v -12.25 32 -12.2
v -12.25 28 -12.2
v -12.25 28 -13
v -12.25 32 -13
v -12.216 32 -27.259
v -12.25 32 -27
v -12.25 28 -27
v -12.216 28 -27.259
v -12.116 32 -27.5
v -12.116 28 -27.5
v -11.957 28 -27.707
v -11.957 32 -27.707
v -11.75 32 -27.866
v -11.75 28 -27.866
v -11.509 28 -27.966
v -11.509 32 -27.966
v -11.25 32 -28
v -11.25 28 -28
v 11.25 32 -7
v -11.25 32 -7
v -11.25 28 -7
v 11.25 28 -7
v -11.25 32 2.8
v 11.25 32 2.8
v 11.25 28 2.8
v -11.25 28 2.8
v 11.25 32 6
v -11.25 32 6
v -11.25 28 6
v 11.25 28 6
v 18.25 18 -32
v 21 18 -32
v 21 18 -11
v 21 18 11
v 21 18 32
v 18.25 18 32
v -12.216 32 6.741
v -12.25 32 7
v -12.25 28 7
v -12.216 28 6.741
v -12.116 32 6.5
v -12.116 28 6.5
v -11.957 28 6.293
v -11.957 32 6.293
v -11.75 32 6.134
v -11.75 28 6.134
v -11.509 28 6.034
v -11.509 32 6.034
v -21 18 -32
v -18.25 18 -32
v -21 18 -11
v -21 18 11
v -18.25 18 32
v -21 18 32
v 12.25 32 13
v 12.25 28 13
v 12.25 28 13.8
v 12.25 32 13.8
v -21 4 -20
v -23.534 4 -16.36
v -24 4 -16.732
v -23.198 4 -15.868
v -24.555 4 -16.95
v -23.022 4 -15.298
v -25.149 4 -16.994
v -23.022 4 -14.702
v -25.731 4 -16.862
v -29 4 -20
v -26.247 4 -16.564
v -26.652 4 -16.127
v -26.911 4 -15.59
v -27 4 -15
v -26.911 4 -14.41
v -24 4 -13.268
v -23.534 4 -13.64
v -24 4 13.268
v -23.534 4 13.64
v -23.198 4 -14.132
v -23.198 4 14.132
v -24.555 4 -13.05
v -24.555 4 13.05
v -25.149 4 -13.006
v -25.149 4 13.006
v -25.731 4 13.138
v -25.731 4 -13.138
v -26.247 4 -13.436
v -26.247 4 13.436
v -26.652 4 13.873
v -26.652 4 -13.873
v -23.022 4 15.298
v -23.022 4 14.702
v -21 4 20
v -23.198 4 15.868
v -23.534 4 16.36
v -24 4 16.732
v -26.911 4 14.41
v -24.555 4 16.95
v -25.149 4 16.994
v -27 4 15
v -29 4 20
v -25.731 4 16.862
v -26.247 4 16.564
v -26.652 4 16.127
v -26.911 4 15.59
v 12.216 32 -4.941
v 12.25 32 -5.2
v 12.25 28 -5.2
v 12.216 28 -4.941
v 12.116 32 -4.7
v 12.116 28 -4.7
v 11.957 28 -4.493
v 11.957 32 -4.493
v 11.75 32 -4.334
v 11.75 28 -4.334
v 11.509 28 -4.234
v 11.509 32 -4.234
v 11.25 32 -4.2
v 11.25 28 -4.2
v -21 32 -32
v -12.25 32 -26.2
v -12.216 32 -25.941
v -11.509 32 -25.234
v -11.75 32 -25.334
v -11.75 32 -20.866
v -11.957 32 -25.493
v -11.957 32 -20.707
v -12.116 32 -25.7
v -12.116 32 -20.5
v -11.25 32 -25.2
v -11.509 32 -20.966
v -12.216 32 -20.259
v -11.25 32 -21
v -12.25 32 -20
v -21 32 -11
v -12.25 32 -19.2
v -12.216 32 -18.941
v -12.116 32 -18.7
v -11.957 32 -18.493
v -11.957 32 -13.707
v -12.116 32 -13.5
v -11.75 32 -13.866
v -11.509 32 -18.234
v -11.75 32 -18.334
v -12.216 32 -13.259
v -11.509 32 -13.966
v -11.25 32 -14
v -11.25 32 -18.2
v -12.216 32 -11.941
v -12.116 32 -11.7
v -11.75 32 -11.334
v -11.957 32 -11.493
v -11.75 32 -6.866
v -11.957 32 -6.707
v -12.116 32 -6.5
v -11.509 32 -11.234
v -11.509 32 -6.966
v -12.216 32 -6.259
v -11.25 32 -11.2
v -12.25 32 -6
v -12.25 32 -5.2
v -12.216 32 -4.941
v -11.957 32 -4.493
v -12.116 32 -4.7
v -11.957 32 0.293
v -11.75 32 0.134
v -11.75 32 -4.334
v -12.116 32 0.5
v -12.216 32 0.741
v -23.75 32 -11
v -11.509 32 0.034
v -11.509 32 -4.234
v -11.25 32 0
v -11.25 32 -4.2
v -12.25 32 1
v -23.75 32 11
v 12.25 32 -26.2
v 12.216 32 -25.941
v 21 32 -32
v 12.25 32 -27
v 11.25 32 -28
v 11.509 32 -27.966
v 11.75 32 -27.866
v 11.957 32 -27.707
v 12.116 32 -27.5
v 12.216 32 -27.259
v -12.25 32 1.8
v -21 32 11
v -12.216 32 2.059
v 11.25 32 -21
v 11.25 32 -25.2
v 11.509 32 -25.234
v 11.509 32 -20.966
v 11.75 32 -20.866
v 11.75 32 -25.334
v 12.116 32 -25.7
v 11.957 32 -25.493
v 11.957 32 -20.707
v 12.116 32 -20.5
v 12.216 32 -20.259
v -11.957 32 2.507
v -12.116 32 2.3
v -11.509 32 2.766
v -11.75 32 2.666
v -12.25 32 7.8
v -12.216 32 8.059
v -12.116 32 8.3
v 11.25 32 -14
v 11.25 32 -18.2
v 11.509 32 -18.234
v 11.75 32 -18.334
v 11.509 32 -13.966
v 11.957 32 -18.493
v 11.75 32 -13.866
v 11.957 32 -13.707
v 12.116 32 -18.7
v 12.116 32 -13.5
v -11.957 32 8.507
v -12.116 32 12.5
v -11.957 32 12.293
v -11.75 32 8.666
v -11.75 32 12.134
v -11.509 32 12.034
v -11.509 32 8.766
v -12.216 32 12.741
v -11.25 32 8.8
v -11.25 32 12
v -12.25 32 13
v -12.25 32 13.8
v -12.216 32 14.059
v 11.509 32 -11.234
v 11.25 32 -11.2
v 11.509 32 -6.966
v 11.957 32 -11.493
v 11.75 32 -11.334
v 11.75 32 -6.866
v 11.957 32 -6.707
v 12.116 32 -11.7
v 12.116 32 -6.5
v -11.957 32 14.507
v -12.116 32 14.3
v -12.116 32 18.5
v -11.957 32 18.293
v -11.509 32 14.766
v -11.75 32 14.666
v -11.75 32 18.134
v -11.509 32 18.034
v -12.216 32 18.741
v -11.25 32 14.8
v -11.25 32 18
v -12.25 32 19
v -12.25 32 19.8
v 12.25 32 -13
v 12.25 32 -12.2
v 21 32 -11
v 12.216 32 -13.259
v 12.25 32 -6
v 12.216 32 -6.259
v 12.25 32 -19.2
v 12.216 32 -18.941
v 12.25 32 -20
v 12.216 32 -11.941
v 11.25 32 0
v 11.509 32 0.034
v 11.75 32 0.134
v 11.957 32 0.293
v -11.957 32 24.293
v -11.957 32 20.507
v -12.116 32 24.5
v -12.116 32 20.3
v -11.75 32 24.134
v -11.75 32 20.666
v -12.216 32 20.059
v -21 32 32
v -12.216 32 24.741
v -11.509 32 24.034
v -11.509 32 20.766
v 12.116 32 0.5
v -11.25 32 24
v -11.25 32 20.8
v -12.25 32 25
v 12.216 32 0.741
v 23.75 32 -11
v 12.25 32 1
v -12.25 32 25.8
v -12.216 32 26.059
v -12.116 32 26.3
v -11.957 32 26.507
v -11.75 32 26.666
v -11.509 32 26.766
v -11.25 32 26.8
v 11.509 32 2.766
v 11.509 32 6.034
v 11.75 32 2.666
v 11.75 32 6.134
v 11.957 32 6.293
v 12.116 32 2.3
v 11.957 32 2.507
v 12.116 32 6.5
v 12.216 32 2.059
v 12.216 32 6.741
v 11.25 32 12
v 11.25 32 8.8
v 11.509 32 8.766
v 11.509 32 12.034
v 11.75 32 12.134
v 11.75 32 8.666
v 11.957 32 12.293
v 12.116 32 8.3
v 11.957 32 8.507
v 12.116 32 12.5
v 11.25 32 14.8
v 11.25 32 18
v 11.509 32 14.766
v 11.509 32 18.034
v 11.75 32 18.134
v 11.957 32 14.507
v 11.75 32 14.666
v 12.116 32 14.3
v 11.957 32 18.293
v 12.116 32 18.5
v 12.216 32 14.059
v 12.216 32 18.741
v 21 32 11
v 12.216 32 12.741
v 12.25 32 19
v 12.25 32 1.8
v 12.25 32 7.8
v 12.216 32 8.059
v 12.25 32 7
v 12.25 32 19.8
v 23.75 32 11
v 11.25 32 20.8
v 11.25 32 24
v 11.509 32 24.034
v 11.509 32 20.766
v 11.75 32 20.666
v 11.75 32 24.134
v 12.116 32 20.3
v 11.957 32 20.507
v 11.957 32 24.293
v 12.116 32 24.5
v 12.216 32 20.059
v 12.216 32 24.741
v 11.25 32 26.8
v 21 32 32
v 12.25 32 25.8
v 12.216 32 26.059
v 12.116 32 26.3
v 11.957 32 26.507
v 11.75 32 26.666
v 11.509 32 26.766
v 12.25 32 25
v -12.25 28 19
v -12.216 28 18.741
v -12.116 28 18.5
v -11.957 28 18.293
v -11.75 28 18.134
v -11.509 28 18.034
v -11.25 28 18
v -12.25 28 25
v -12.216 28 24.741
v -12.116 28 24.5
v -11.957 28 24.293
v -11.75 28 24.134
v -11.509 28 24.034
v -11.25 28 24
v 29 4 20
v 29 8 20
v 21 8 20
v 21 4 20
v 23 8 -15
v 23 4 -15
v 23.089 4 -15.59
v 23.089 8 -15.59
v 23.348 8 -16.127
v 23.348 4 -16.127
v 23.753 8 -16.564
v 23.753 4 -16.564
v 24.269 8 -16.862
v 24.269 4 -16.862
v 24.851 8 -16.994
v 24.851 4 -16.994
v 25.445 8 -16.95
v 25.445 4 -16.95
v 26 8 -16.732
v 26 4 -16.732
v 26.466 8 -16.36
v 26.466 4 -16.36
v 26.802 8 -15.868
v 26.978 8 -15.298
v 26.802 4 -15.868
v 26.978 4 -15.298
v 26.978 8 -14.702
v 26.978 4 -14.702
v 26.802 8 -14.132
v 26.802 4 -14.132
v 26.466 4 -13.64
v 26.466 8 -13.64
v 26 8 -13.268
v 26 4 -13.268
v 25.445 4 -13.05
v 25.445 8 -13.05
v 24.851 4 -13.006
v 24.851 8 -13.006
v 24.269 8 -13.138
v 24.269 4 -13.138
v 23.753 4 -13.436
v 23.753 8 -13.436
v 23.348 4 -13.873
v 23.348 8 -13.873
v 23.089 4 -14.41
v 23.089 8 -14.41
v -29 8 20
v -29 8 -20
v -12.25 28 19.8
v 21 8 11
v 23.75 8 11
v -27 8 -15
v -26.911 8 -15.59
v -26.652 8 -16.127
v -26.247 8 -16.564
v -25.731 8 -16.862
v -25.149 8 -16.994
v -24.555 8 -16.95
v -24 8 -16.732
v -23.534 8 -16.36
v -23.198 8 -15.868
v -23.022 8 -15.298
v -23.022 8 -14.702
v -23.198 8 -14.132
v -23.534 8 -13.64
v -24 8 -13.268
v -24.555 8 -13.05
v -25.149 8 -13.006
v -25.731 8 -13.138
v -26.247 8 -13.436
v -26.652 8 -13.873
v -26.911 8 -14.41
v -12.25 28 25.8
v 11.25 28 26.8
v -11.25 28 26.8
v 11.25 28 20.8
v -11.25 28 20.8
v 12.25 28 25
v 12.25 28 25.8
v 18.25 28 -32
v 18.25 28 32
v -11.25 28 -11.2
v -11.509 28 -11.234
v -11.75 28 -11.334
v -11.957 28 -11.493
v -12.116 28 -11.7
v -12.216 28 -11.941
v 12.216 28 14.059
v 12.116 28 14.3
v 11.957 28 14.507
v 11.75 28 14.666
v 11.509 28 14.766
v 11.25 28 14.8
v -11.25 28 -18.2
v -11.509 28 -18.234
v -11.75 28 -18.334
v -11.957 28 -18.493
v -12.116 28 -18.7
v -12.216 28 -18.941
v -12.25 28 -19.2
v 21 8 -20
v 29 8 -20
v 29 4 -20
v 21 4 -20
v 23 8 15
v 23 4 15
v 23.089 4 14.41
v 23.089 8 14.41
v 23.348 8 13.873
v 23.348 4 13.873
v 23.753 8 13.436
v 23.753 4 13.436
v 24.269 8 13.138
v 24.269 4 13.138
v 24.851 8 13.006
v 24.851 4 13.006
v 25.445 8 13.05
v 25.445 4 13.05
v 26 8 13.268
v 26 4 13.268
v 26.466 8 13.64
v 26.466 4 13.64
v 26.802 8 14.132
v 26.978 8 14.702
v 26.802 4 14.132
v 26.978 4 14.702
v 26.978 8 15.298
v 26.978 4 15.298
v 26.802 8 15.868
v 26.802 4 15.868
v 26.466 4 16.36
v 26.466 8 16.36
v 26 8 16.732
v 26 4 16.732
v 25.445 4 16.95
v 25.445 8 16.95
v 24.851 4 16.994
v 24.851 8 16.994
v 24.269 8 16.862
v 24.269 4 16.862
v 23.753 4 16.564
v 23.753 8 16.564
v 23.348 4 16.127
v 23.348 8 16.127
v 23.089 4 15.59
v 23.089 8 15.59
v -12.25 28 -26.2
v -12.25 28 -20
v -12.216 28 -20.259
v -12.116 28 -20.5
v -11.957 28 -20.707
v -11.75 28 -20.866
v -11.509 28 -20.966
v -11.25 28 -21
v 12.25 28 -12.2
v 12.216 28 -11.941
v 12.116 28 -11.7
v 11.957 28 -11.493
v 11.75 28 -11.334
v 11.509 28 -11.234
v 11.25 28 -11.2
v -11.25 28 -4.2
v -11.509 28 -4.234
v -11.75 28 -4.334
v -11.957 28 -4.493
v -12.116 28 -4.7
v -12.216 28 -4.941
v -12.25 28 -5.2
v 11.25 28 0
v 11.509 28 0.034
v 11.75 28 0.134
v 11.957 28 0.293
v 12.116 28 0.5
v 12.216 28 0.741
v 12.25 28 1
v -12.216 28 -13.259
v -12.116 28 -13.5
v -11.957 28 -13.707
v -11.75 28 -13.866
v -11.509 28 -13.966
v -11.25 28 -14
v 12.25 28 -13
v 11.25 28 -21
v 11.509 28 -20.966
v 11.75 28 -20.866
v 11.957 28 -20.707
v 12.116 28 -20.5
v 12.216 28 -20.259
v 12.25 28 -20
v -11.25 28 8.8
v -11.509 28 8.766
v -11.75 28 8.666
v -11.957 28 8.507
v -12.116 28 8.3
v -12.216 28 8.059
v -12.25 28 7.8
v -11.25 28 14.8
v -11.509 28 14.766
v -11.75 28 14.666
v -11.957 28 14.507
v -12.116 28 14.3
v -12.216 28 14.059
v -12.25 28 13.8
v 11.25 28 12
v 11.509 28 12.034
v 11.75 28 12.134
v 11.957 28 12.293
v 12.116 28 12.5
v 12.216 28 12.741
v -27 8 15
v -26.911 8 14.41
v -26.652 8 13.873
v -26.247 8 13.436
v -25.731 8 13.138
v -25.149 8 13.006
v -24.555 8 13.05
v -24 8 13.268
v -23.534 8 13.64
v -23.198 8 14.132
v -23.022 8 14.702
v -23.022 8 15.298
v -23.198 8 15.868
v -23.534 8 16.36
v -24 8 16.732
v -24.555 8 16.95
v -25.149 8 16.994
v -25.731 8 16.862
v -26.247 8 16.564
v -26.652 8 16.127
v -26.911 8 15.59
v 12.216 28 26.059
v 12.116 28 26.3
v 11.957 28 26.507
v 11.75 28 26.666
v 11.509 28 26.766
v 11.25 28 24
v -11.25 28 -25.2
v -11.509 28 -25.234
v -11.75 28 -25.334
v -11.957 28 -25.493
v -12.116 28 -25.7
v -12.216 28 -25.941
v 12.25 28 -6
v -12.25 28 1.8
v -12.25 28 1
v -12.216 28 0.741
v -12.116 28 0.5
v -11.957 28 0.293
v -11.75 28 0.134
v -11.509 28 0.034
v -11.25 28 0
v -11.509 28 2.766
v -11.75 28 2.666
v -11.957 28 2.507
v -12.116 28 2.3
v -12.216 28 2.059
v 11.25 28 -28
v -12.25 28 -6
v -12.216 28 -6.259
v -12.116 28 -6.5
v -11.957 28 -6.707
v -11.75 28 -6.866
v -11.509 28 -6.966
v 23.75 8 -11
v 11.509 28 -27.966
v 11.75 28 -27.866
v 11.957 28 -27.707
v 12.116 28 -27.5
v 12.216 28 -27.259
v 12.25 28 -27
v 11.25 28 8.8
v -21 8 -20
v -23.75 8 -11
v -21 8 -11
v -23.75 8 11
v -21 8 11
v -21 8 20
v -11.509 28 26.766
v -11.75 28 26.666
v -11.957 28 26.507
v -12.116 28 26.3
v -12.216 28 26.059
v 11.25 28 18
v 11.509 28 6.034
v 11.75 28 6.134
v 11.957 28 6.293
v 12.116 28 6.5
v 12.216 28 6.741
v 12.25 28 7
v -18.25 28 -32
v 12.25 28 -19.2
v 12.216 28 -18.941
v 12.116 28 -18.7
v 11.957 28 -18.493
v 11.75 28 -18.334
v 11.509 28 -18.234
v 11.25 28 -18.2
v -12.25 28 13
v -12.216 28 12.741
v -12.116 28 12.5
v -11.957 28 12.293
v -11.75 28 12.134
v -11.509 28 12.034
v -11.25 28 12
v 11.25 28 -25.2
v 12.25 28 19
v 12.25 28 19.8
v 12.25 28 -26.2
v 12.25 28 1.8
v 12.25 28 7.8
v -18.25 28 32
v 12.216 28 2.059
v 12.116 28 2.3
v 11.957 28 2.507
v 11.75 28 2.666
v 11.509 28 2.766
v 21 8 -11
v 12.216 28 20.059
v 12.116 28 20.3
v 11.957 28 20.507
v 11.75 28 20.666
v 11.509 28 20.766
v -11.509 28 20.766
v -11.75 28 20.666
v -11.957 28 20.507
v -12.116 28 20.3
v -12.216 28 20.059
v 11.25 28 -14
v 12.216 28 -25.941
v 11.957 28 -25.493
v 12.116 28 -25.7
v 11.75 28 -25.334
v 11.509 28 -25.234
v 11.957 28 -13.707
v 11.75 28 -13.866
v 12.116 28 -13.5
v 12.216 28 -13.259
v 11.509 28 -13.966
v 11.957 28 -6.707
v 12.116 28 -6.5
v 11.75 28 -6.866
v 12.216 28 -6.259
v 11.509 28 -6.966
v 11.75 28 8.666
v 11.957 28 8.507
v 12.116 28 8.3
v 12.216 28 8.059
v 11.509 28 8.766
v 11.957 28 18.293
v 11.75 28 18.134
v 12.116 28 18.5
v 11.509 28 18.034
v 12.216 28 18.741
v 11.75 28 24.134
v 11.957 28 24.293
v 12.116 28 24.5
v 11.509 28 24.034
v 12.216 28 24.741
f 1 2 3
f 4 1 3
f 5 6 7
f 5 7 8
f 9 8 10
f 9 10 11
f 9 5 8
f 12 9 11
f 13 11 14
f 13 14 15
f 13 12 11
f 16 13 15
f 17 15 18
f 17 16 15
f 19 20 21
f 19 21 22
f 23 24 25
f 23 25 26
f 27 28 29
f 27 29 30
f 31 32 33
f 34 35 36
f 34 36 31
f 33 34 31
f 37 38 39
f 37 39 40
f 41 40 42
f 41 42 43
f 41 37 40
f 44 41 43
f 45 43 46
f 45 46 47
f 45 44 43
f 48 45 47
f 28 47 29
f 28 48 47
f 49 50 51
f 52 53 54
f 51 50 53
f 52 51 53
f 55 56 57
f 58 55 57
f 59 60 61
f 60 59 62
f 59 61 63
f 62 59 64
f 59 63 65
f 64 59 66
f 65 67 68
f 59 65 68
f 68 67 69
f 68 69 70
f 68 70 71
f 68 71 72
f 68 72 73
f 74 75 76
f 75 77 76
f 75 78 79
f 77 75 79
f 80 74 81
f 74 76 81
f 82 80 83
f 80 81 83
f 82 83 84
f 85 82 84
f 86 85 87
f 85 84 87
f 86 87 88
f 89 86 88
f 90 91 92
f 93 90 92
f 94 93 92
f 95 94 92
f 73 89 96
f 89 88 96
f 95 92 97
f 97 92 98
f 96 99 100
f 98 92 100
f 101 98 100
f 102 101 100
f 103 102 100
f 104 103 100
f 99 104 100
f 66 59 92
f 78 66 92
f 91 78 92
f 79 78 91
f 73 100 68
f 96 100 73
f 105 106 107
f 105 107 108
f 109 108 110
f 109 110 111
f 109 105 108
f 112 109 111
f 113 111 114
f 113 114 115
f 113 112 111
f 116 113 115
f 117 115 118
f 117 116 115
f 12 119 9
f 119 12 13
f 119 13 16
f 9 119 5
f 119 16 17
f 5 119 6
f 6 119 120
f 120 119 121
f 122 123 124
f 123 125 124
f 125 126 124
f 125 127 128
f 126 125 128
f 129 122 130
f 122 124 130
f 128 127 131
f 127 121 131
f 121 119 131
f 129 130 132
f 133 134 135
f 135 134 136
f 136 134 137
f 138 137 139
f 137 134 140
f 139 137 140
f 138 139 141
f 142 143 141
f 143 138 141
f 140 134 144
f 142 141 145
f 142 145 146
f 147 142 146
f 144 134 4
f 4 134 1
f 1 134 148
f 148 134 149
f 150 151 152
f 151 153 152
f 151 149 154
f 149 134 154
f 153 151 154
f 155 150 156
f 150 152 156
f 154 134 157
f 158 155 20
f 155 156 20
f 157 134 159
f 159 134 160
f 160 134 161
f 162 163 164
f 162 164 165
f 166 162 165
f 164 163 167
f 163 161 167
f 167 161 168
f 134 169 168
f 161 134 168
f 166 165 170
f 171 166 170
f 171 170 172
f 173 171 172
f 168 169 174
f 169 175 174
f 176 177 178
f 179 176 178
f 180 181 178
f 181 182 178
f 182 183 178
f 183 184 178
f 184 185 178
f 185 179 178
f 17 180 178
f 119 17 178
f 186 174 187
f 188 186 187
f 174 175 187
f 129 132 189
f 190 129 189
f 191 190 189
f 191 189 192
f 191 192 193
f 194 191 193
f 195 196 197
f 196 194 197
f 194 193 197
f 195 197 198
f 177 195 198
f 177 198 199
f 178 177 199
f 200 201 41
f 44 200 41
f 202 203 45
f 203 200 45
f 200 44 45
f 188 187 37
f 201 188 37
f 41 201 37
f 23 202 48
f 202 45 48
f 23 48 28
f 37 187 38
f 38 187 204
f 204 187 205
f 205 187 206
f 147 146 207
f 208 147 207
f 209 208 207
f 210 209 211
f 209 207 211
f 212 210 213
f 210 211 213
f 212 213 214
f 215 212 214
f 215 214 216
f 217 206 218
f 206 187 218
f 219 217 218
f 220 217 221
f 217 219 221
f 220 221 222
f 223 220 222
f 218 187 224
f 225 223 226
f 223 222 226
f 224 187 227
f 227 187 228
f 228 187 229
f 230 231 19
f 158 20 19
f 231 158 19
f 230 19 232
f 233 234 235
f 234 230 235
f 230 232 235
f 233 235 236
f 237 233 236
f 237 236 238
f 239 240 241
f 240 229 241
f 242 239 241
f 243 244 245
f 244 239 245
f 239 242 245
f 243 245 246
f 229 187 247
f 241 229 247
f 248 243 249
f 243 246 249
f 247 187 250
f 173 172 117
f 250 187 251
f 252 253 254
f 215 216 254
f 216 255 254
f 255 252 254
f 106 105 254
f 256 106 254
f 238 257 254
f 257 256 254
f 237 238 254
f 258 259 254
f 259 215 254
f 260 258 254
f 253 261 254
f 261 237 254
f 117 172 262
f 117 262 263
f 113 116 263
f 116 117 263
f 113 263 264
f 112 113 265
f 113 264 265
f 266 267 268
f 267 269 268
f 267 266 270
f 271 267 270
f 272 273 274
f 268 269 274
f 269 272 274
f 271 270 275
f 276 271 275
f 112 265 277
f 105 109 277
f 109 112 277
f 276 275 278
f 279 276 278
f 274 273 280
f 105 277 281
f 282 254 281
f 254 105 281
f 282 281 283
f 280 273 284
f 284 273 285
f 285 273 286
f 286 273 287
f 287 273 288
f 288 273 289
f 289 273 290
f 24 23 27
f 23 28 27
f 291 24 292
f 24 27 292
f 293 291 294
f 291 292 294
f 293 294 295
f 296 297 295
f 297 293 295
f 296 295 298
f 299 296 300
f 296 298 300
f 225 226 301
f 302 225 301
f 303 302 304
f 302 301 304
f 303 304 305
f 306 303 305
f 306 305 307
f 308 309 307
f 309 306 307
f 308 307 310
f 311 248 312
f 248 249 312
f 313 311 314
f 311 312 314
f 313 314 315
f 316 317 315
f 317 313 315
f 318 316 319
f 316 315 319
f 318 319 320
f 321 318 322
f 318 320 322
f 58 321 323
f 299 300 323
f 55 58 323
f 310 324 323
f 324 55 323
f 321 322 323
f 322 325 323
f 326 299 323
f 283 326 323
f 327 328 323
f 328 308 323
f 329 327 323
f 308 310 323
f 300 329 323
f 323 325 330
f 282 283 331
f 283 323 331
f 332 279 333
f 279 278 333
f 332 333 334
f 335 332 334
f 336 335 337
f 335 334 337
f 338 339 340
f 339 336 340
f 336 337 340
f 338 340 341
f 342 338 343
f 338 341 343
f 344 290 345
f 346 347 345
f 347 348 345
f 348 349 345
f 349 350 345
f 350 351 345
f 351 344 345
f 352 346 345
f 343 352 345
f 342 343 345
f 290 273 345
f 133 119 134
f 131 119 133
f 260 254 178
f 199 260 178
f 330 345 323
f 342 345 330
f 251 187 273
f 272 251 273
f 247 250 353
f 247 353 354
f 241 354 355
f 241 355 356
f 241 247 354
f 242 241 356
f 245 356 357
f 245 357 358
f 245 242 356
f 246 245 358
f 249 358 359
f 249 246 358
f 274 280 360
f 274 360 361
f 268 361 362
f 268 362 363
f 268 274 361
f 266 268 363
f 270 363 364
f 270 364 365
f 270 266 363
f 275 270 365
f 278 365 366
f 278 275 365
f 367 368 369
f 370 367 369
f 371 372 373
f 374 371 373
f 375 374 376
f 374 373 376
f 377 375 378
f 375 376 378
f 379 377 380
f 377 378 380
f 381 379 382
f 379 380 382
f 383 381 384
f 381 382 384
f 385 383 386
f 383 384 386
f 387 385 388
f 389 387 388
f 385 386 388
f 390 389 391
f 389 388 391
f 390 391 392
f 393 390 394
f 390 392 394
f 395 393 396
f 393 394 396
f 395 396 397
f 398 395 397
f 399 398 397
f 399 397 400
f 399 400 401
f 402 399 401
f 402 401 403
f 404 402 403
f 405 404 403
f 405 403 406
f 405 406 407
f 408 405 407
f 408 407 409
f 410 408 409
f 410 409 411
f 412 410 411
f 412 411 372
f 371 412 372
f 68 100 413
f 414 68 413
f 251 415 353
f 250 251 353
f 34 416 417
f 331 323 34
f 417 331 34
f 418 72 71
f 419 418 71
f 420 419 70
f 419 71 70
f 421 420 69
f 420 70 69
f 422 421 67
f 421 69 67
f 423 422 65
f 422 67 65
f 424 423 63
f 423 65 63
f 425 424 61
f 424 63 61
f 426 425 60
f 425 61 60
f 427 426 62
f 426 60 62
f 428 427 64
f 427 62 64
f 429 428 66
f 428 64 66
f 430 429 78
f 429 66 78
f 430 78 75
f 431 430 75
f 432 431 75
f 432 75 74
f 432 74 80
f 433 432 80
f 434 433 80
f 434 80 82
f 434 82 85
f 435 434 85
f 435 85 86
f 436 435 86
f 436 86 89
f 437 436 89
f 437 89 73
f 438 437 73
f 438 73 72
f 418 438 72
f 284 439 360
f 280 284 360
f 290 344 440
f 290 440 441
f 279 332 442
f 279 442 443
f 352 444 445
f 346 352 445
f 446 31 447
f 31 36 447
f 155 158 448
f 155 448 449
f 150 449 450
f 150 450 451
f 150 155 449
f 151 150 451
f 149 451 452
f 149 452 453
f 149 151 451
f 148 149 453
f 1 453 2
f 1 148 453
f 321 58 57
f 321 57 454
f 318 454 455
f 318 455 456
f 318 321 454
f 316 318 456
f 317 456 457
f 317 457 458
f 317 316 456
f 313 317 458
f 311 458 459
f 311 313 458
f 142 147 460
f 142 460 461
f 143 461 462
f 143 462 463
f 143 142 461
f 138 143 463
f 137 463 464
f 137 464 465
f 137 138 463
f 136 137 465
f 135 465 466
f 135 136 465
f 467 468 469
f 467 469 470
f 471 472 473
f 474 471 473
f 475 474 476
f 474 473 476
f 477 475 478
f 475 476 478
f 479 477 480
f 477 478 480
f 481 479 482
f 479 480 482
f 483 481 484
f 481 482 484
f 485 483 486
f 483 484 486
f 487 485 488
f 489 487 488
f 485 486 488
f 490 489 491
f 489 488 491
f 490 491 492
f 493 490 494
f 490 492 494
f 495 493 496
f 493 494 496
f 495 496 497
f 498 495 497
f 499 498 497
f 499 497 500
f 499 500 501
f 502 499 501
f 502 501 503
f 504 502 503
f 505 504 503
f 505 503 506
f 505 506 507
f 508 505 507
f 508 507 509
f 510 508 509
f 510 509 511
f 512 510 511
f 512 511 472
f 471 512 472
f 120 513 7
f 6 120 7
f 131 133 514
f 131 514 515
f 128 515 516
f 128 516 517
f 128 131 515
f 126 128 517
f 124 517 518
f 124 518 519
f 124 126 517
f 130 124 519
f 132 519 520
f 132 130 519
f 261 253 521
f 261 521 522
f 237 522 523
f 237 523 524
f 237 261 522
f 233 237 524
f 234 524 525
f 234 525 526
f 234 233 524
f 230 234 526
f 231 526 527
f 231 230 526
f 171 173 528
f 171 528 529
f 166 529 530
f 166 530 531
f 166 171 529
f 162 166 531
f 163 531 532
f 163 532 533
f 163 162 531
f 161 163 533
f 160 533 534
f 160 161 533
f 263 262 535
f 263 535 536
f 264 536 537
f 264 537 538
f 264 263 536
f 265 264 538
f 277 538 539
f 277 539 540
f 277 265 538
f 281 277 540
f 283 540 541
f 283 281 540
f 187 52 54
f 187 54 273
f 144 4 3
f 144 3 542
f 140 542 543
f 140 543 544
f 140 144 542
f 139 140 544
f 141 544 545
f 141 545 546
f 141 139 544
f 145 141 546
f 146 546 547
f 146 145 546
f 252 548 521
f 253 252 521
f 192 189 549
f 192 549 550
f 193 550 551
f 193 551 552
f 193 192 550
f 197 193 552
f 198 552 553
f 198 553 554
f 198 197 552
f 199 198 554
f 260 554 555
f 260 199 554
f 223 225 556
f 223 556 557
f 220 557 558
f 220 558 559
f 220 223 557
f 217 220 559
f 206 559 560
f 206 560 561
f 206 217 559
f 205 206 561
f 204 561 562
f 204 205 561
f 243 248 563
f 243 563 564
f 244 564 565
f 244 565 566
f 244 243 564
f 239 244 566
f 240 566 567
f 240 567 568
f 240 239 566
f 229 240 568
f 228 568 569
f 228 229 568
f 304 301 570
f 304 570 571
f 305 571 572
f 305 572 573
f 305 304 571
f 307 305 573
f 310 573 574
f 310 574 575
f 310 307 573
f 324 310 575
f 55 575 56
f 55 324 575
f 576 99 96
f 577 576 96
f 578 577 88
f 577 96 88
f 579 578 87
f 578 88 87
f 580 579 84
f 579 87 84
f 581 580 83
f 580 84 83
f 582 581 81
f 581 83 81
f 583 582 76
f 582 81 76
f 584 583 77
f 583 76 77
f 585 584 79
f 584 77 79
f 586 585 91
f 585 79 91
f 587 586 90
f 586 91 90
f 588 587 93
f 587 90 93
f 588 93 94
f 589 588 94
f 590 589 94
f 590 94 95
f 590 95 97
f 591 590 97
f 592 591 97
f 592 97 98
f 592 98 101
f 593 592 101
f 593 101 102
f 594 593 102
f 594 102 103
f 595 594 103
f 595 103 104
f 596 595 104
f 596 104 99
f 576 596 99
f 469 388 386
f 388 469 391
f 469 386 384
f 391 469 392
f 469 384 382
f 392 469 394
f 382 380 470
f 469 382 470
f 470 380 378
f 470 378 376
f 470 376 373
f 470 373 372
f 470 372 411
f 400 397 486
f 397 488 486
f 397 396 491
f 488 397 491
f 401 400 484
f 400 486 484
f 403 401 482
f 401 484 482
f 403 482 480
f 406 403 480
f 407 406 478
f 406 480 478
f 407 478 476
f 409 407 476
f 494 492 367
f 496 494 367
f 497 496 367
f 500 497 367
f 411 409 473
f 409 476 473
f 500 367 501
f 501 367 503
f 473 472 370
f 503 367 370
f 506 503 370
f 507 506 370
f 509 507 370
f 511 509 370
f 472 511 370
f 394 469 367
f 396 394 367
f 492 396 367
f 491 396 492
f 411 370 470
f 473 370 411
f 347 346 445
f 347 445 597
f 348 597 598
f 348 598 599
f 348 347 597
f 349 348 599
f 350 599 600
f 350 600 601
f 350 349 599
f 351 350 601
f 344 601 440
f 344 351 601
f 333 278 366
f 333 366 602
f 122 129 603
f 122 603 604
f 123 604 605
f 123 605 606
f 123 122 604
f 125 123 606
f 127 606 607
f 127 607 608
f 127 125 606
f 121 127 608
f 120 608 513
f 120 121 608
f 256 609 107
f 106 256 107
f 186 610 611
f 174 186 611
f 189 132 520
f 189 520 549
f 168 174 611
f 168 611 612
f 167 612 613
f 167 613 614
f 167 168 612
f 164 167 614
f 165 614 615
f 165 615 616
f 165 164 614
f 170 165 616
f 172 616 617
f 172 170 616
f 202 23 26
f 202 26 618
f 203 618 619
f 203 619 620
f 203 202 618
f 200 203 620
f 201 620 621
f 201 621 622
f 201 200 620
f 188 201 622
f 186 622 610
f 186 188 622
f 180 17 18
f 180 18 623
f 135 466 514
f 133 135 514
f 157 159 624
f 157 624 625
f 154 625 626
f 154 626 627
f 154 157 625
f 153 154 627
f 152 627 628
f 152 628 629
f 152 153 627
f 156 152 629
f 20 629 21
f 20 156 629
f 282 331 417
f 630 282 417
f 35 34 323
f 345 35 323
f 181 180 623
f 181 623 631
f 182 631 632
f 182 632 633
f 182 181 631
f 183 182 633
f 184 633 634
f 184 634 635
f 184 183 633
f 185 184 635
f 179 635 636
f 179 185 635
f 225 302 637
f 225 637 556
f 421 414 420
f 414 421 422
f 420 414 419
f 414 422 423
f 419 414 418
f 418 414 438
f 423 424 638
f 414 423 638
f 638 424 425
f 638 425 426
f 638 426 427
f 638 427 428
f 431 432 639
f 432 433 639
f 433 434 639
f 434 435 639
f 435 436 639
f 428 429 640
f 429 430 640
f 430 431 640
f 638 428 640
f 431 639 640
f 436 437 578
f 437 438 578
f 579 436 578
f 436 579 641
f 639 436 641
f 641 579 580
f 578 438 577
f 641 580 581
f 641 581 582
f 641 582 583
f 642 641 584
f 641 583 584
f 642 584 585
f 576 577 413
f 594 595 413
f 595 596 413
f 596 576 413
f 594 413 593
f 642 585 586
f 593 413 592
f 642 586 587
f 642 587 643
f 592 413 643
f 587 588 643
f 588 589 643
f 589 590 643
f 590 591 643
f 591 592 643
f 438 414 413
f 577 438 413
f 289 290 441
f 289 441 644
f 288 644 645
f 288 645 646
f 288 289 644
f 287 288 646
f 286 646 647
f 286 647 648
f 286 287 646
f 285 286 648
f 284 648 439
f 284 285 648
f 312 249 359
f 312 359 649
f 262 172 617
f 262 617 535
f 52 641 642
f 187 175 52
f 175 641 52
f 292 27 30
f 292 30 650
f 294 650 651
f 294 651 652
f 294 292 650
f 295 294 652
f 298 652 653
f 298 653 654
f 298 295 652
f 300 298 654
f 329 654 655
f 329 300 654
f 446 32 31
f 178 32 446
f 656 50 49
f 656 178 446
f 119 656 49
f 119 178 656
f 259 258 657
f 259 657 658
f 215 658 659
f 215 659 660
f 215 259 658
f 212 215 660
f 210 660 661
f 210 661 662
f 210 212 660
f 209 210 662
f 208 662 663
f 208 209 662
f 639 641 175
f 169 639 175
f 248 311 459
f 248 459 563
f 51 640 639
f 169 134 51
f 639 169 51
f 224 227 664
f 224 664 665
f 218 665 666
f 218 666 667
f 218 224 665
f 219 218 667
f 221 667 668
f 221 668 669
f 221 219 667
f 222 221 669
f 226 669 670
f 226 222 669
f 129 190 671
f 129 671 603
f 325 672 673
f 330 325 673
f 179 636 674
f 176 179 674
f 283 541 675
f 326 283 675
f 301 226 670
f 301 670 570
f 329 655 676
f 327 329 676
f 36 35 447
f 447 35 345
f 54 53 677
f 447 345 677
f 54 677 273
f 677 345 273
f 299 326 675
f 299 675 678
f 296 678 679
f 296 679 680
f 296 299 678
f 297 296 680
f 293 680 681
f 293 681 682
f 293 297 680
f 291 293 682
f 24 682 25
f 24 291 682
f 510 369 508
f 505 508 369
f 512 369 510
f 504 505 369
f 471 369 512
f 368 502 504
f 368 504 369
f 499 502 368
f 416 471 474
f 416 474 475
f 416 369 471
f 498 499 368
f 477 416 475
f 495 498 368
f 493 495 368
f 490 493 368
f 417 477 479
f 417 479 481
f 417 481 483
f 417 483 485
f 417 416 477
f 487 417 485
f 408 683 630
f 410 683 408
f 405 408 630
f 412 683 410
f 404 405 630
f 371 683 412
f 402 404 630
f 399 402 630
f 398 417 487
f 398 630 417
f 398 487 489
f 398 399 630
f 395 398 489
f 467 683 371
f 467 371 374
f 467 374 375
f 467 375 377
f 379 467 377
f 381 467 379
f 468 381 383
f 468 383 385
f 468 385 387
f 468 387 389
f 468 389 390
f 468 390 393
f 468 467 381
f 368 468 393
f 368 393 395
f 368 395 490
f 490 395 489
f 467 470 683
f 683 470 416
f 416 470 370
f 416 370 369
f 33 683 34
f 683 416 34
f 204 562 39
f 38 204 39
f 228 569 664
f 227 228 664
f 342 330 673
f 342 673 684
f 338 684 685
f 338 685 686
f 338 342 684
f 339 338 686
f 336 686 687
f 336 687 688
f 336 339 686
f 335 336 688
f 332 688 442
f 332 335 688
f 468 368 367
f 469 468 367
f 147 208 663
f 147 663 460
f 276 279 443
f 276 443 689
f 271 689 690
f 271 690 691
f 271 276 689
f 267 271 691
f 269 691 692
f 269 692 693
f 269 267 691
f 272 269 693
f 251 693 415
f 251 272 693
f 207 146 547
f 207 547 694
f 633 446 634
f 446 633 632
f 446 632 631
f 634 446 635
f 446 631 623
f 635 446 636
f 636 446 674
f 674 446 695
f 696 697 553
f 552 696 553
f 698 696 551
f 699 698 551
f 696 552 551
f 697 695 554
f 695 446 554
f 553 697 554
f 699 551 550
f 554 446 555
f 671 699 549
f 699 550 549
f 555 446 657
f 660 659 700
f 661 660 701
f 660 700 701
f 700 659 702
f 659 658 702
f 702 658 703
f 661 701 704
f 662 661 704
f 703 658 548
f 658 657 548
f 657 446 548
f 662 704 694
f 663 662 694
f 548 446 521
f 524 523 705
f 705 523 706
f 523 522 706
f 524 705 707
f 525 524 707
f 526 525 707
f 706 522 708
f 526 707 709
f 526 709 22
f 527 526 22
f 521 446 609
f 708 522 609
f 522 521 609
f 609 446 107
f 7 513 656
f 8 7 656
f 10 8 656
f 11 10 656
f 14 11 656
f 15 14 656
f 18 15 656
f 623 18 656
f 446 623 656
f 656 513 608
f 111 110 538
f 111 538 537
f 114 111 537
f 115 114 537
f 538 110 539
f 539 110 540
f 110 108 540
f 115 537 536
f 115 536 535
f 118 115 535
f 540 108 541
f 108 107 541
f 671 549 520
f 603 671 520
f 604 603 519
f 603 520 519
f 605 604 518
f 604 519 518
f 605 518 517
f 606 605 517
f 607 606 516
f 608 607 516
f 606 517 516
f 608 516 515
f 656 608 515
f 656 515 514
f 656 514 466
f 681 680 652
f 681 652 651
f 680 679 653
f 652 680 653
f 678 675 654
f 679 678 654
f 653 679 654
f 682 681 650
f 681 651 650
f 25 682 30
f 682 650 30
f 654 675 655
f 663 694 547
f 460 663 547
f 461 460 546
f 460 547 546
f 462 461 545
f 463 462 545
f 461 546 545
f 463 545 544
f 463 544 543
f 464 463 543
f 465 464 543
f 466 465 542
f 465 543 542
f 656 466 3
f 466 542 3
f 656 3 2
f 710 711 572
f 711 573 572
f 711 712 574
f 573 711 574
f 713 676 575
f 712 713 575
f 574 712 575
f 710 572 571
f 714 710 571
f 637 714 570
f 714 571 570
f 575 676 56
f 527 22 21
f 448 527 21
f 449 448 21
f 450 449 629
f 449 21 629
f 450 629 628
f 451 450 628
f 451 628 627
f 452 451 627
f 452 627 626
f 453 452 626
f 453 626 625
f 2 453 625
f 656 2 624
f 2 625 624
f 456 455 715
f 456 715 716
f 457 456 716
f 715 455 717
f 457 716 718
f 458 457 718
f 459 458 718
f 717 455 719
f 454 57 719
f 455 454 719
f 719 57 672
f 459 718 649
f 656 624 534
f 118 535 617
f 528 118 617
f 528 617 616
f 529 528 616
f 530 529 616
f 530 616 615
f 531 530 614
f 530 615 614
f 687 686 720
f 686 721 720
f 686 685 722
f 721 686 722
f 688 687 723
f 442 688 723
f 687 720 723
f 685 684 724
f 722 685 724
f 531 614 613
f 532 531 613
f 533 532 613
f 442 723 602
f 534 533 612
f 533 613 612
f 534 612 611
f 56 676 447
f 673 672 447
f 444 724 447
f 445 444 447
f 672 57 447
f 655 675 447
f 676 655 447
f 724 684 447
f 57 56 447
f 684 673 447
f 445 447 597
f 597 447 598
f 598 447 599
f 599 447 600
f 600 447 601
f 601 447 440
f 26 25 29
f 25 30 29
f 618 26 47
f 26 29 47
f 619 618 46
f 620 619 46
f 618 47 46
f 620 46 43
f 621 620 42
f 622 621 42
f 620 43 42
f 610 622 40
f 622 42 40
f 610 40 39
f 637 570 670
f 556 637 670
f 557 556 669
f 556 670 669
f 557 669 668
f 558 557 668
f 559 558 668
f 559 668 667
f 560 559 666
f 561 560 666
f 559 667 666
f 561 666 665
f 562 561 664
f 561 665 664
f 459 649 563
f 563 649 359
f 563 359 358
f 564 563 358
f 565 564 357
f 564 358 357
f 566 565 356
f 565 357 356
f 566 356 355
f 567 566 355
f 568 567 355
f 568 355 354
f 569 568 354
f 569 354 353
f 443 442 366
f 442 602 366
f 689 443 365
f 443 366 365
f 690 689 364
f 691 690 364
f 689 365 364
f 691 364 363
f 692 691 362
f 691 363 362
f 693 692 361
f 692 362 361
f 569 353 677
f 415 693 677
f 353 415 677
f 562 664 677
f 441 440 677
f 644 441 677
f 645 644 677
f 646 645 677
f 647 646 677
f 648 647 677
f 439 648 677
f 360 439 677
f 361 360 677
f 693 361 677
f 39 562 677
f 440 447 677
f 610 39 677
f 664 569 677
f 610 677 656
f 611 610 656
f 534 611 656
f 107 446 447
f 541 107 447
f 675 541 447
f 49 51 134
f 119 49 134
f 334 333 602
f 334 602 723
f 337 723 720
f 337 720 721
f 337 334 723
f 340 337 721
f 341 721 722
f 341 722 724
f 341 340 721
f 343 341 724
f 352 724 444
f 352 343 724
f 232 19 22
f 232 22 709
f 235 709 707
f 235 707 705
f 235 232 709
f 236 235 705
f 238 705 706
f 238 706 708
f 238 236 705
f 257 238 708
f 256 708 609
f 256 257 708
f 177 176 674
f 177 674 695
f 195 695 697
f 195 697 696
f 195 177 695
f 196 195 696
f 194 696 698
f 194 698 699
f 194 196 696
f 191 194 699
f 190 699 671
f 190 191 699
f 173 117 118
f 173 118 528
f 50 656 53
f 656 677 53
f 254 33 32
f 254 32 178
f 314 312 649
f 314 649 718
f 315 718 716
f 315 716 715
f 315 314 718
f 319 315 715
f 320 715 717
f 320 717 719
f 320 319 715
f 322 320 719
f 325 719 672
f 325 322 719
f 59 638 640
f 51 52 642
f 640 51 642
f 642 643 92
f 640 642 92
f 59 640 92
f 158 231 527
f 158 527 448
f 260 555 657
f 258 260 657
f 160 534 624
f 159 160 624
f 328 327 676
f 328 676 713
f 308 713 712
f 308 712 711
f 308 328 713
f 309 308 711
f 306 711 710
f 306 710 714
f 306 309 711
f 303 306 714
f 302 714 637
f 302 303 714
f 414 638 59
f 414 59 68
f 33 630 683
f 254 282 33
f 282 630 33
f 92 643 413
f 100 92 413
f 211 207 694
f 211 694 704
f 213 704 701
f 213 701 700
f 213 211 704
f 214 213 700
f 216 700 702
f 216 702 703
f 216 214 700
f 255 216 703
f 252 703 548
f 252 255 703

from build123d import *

# Parameters (mm, degrees)
BOSS_EXTRUDE1_DEPTH      = 32
CUT_EXTRUDE5_DEPTH       = 3.999999672
LPATTERN1_COUNT          = 5
LPATTERN1_PITCH          = 7
LPATTERN2_COUNT          = 5
LPATTERN2_PITCH          = 6
SKETCH12_W               = 8
SKETCH12_H               = 4
CUT_EXTRUDE7_DEPTH       = 12
CUT_EXTRUDE8_DEPTH       = 17
CUT_EXTRUDE8_DEPTH_BACK  = 4
SKETCH11_W               = 8
SKETCH11_H               = 31.059426665
CUT_EXTRUDE10_DEPTH      = 17
CUT_EXTRUDE10_DEPTH_BACK = 4
SKETCH13_W               = 10.75
SKETCH13_H               = 28.869342983
SKETCH13_W_2             = 7.056880225
SKETCH13_H_2             = 29.936318605
F_4_0MM_DOWEL_HOLE1_D    = 4


with BuildPart() as part:
    # Sketch1 → Boss-Extrude1 (new, symmetric)
    with BuildSketch(Plane.XY):
        Polygon((-23.75, 31.999999672), (23.75, 31.999999672), (23.75, 8), (29, 8), (29, 4), (21, 4), (21, 18), (18.25, 18), (18.25, 28), (-18.25, 28), (-18.25, 18), (-21, 18), (-21, 4), (-29, 4), (-29, 8), (-23.75, 8), align=None)
    extrude(amount=BOSS_EXTRUDE1_DEPTH, both=True)

    # Sketch8 → Cut-Extrude5 (cut)
    with BuildSketch(Plane(origin=(0, 31.999999672, 0), x_dir=(1, 0, 0), z_dir=(0, 1, 0))):
        with BuildLine():
            Line((11.25, -2.8), (-11.25, -2.8))
            ThreePointArc((-11.25, -2.8), (-11.957106781, -2.507106781), (-12.25, -1.8))
            Line((-12.25, -1.8), (-12.25, -1))
            ThreePointArc((-12.25, -1), (-11.957106781, -0.292893219), (-11.25, 0))
            Line((-11.25, 0), (11.25, 0))
            ThreePointArc((11.25, 0), (11.957106781, -0.292893219), (12.25, -1))
            Line((12.25, -1), (12.25, -1.8))
            ThreePointArc((12.25, -1.8), (11.957106781, -2.507106781), (11.25, -2.8))
        make_face()
    cut_extrude5 = extrude(amount=-CUT_EXTRUDE5_DEPTH, mode=Mode.SUBTRACT)

    # LPattern1: Cut-Extrude5 ×5
    with Locations(*[(0, 0, -i * LPATTERN1_PITCH) for i in range(1, LPATTERN1_COUNT)]):
        add(cut_extrude5, mode=Mode.SUBTRACT)

    # LPattern2: Cut-Extrude5 ×5
    with Locations(*[(0, 0, i * LPATTERN2_PITCH) for i in range(1, LPATTERN2_COUNT)]):
        add(cut_extrude5, mode=Mode.SUBTRACT)

    # Sketch12 → Cut-Extrude7 (cut)
    with BuildSketch(Plane(origin=(0, 0, -32), x_dir=(-1, 0, 0), z_dir=(0, 0, -1))):
        with Locations((25, 6)):
            Rectangle(SKETCH12_W, SKETCH12_H)
        with Locations((-25, 6)):
            Rectangle(SKETCH12_W, SKETCH12_H)
    cut_extrude7 = extrude(amount=-CUT_EXTRUDE7_DEPTH, mode=Mode.SUBTRACT)

    # Mirror1: Cut-Extrude7 across plane
    add(cut_extrude7.mirror(Plane.XY), mode=Mode.SUBTRACT)

    # Sketch11 → Cut-Extrude8 (cut, two sides: drawn at the far end of the back side and taken through both)
    with BuildSketch(Plane(origin=(0, 0, -15), x_dir=(-1, 0, 0), z_dir=(0, 0, -1)).offset(-CUT_EXTRUDE8_DEPTH_BACK)):
        with Locations((25, 23.529713333)):
            Rectangle(SKETCH11_W, SKETCH11_H)
        with Locations((-25, 23.529713333)):
            Rectangle(SKETCH11_W, SKETCH11_H)
    extrude(amount=CUT_EXTRUDE8_DEPTH + CUT_EXTRUDE8_DEPTH_BACK, mode=Mode.SUBTRACT)

    # Sketch13 → Cut-Extrude10 (cut, two sides: drawn at the far end of the back side and taken through both)
    with BuildSketch(Plane.XY.offset(15).offset(-CUT_EXTRUDE10_DEPTH_BACK)):
        with Locations((26.375, 22.434671492)):
            Rectangle(SKETCH13_W, SKETCH13_H)
        with Locations((-24.528440113, 22.968159303)):
            Rectangle(SKETCH13_W_2, SKETCH13_H_2)
    extrude(amount=CUT_EXTRUDE10_DEPTH + CUT_EXTRUDE10_DEPTH_BACK, mode=Mode.SUBTRACT)

    # Ø4.0mm Dowel Hole1 (through all)
    with Locations(Plane(origin=(0, 8, 0), x_dir=(1, 0, 0), z_dir=(0, 1, 0))):
        with Locations((25, -15), (25, 15), (-25, 15), (-25, -15)):
            Hole(F_4_0MM_DOWEL_HOLE1_D / 2)


solid = part.part
